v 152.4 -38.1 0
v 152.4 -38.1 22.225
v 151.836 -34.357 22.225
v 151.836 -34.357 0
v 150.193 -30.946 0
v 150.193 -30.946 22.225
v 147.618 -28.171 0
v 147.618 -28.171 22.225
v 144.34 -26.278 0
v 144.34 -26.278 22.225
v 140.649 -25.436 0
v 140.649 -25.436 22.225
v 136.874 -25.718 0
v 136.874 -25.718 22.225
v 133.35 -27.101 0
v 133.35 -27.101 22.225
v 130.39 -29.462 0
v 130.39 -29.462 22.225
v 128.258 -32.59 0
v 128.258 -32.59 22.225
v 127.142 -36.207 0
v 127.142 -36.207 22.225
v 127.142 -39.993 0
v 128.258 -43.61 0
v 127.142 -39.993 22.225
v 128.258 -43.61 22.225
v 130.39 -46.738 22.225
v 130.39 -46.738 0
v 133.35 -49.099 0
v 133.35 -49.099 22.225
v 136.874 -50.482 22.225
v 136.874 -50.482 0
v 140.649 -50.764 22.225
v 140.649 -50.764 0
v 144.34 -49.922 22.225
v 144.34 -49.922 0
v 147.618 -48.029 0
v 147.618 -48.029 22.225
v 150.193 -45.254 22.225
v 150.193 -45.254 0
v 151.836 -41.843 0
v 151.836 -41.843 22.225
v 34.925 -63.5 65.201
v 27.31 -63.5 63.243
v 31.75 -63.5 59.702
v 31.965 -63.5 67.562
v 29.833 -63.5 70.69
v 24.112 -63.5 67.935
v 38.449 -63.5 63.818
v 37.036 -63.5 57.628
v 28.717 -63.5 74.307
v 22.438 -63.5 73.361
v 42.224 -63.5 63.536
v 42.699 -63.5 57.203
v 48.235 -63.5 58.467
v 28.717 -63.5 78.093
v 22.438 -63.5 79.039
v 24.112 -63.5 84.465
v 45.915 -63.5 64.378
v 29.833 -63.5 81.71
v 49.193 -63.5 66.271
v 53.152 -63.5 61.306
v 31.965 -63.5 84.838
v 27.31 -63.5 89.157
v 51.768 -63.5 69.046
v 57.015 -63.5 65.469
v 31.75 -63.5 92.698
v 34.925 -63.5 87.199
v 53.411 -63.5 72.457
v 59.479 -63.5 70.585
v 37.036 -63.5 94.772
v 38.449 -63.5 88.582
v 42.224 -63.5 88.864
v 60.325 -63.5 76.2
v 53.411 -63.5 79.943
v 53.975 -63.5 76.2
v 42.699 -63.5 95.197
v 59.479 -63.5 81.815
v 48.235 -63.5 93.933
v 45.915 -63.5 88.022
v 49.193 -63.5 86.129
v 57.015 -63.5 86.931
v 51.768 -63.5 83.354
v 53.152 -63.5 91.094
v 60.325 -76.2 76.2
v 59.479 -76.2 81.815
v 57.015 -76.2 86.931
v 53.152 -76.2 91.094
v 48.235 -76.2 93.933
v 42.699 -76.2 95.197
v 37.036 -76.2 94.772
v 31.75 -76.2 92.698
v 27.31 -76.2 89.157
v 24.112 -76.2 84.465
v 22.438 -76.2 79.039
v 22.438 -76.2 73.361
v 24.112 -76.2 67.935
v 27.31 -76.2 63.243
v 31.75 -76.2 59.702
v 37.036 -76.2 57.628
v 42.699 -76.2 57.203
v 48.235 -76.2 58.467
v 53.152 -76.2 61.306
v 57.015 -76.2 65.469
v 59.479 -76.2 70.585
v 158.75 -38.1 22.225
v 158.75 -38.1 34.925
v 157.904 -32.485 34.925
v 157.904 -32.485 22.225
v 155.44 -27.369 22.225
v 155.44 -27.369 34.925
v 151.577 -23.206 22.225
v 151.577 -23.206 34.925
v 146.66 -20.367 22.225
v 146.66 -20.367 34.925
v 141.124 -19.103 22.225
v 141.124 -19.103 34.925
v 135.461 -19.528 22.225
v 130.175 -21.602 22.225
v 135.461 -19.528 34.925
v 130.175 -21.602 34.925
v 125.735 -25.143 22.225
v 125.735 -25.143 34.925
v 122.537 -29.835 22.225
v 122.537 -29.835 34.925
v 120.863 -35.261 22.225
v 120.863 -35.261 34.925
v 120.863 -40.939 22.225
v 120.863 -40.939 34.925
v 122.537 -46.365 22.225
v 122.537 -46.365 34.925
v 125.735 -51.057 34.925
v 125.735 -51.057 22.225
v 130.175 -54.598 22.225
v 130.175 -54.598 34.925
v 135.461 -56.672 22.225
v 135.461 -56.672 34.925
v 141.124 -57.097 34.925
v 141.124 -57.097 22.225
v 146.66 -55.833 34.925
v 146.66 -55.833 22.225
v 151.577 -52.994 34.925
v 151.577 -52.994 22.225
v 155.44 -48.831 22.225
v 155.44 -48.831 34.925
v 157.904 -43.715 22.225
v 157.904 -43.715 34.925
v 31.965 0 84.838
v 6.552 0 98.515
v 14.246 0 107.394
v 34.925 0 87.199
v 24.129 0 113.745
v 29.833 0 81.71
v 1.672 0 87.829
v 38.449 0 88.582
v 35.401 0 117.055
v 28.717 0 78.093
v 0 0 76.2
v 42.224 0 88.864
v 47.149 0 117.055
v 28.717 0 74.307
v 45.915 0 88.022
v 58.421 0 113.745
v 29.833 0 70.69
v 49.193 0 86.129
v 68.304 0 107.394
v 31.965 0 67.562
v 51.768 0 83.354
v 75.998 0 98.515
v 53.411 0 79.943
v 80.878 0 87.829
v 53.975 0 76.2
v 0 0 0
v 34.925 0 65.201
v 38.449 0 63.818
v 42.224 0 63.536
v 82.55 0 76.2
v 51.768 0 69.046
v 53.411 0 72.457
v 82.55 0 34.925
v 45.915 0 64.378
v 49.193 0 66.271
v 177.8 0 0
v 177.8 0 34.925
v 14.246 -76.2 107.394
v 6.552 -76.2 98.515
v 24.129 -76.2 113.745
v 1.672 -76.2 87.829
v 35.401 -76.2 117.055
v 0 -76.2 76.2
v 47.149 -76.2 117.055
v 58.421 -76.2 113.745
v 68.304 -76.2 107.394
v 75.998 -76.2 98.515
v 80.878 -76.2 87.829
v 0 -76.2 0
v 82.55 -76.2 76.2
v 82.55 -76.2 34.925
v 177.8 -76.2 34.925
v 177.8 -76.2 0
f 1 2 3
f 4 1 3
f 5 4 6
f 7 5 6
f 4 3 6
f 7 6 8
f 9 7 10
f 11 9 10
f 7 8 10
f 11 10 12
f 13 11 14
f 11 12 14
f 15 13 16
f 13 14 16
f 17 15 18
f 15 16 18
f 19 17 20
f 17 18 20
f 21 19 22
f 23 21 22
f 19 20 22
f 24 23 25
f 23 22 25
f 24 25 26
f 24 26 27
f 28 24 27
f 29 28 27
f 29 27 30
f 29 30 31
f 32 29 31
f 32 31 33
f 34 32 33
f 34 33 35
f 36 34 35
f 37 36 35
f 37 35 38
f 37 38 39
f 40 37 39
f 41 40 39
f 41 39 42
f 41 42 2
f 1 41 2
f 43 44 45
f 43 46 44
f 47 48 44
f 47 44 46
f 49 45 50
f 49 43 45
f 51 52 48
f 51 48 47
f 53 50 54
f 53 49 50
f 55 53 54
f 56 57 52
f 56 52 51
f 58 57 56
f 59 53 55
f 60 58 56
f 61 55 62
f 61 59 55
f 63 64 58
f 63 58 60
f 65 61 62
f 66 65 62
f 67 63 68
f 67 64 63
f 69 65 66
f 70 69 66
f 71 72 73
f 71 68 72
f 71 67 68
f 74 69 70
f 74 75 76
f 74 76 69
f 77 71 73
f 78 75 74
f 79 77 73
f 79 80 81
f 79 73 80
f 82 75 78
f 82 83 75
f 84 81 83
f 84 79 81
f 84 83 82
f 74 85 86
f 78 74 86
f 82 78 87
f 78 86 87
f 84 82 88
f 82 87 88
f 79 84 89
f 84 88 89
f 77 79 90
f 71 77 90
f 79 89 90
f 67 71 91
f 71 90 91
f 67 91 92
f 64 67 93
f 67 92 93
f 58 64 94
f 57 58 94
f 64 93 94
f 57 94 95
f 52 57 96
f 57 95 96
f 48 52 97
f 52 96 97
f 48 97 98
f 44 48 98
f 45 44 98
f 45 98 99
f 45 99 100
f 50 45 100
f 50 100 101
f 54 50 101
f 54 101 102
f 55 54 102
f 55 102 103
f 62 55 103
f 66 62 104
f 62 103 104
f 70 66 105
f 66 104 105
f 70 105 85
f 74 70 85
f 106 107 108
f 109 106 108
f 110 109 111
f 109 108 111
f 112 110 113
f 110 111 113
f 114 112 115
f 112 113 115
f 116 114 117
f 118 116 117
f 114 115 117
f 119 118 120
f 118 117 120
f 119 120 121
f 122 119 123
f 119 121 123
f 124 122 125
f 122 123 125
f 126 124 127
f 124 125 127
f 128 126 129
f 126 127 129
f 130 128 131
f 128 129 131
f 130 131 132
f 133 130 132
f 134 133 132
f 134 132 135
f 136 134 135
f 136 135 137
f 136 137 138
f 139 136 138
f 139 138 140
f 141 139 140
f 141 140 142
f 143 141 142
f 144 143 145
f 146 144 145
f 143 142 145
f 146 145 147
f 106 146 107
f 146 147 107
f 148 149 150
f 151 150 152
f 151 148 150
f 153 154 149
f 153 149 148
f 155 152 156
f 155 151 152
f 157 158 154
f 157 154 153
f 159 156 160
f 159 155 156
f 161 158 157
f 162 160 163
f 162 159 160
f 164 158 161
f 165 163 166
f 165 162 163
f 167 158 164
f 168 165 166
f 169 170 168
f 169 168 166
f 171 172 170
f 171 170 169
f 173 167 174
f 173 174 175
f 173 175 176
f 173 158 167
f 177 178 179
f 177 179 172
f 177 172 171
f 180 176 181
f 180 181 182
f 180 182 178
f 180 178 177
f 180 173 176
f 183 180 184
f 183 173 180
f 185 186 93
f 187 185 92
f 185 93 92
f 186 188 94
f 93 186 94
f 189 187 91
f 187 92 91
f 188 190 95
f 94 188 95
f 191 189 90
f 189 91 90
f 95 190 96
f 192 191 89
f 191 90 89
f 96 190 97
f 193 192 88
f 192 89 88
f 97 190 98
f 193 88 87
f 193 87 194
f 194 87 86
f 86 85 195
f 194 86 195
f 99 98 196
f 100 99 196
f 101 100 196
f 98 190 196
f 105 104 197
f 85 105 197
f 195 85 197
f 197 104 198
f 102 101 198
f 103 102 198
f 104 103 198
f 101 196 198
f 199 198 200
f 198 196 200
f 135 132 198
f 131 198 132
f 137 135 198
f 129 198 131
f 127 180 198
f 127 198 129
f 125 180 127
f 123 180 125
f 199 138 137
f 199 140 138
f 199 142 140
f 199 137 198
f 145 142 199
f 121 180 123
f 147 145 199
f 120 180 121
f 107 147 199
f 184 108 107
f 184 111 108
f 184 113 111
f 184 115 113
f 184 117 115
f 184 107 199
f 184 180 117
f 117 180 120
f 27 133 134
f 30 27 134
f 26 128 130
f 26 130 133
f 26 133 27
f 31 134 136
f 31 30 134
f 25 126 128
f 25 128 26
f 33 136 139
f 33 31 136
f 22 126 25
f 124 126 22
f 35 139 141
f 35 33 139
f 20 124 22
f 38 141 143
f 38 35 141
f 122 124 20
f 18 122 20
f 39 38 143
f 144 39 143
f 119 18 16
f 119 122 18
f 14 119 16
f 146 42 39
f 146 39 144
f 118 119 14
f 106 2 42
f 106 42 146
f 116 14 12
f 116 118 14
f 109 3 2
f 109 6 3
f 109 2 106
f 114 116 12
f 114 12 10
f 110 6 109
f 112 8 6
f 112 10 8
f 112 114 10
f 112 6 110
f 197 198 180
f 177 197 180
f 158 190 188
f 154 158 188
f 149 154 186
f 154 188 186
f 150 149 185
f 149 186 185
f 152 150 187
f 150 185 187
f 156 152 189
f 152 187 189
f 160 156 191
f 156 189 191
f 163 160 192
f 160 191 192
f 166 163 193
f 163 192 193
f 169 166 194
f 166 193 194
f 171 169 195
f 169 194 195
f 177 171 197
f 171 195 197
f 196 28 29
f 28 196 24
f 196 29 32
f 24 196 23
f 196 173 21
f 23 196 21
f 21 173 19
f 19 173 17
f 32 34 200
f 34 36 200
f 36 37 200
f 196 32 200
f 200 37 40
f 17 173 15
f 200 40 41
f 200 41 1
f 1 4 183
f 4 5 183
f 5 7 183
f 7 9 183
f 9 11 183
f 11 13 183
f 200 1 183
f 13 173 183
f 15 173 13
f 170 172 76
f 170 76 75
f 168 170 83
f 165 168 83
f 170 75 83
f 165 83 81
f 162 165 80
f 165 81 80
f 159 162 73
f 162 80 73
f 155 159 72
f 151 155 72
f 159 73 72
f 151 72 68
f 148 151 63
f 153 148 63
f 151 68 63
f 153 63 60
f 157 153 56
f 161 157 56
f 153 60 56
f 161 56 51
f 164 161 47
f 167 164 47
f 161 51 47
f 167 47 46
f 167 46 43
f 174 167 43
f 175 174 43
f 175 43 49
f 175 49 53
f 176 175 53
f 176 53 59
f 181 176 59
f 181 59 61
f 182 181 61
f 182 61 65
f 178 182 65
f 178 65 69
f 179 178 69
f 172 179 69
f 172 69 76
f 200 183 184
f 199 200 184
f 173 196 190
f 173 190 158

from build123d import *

# Parameters (mm, degrees)
F0_W      = 177.8
F0_H      = 34.925
F1_DEPTH  = 76.2
F2_W      = 82.55
F2_H      = 76.2
F3_DEPTH  = 88.9
F5_DEPTH  = 76.201
F6_R      = 19.05
F7_DEPTH  = 12.7
F8_R      = 12.7
F9_DEPTH  = 34.926
F10_R     = 19.05
F11_DEPTH = 12.7
F12_R     = 12.7
F13_DEPTH = 76.201


with BuildPart() as f1:
    # F0 (on Front) → F1 (new body)
    with BuildSketch(Plane.XZ):
        with Locations((88.9, 17.4625)):
            Rectangle(F0_W, F0_H)
    extrude(amount=F1_DEPTH)

    # F2 (on face) → F3 (join)
    with BuildSketch(Plane.XY.offset(34.925)):
        with Locations((41.275, -38.1)):
            Rectangle(F2_W, F2_H)
    extrude(amount=F3_DEPTH)

    # F4 (on face) → F5 (cut, through all)
    with BuildSketch(Plane.XZ.offset(76.2)):
        with BuildLine():
            ThreePointArc((0, 76.2), (41.275, 117.475), (82.55, 76.2))
            Line((82.55, 76.2), (82.55, 123.825))
            Line((82.55, 123.825), (0, 123.825))
            Line((0, 123.825), (0, 76.2))
        make_face()
    extrude(amount=-F5_DEPTH, mode=Mode.SUBTRACT)

    # F6 (on face) → F7 (cut)
    with BuildSketch(Plane.XY.offset(34.925)):
        with Locations((139.7, -38.1)):
            Circle(F6_R)
    extrude(amount=-F7_DEPTH, mode=Mode.SUBTRACT)

    # F8 (on face) → F9 (cut, through all)
    with BuildSketch(Plane.XY.offset(34.925)):
        with Locations((139.7, -38.1)):
            Circle(F8_R)
    extrude(amount=-F9_DEPTH, mode=Mode.SUBTRACT)

    # F10 (on face) → F11 (cut)
    with BuildSketch(Plane.XZ.offset(76.2)):
        with Locations((41.275, 76.2)):
            Circle(F10_R)
    extrude(amount=-F11_DEPTH, mode=Mode.SUBTRACT)

    # F12 (on face) → F13 (cut, through all)
    with BuildSketch(Plane.XZ.offset(76.2)):
        with Locations((41.275, 76.2)):
            Circle(F12_R)
    extrude(amount=-F13_DEPTH, mode=Mode.SUBTRACT)


solid = f1.part
